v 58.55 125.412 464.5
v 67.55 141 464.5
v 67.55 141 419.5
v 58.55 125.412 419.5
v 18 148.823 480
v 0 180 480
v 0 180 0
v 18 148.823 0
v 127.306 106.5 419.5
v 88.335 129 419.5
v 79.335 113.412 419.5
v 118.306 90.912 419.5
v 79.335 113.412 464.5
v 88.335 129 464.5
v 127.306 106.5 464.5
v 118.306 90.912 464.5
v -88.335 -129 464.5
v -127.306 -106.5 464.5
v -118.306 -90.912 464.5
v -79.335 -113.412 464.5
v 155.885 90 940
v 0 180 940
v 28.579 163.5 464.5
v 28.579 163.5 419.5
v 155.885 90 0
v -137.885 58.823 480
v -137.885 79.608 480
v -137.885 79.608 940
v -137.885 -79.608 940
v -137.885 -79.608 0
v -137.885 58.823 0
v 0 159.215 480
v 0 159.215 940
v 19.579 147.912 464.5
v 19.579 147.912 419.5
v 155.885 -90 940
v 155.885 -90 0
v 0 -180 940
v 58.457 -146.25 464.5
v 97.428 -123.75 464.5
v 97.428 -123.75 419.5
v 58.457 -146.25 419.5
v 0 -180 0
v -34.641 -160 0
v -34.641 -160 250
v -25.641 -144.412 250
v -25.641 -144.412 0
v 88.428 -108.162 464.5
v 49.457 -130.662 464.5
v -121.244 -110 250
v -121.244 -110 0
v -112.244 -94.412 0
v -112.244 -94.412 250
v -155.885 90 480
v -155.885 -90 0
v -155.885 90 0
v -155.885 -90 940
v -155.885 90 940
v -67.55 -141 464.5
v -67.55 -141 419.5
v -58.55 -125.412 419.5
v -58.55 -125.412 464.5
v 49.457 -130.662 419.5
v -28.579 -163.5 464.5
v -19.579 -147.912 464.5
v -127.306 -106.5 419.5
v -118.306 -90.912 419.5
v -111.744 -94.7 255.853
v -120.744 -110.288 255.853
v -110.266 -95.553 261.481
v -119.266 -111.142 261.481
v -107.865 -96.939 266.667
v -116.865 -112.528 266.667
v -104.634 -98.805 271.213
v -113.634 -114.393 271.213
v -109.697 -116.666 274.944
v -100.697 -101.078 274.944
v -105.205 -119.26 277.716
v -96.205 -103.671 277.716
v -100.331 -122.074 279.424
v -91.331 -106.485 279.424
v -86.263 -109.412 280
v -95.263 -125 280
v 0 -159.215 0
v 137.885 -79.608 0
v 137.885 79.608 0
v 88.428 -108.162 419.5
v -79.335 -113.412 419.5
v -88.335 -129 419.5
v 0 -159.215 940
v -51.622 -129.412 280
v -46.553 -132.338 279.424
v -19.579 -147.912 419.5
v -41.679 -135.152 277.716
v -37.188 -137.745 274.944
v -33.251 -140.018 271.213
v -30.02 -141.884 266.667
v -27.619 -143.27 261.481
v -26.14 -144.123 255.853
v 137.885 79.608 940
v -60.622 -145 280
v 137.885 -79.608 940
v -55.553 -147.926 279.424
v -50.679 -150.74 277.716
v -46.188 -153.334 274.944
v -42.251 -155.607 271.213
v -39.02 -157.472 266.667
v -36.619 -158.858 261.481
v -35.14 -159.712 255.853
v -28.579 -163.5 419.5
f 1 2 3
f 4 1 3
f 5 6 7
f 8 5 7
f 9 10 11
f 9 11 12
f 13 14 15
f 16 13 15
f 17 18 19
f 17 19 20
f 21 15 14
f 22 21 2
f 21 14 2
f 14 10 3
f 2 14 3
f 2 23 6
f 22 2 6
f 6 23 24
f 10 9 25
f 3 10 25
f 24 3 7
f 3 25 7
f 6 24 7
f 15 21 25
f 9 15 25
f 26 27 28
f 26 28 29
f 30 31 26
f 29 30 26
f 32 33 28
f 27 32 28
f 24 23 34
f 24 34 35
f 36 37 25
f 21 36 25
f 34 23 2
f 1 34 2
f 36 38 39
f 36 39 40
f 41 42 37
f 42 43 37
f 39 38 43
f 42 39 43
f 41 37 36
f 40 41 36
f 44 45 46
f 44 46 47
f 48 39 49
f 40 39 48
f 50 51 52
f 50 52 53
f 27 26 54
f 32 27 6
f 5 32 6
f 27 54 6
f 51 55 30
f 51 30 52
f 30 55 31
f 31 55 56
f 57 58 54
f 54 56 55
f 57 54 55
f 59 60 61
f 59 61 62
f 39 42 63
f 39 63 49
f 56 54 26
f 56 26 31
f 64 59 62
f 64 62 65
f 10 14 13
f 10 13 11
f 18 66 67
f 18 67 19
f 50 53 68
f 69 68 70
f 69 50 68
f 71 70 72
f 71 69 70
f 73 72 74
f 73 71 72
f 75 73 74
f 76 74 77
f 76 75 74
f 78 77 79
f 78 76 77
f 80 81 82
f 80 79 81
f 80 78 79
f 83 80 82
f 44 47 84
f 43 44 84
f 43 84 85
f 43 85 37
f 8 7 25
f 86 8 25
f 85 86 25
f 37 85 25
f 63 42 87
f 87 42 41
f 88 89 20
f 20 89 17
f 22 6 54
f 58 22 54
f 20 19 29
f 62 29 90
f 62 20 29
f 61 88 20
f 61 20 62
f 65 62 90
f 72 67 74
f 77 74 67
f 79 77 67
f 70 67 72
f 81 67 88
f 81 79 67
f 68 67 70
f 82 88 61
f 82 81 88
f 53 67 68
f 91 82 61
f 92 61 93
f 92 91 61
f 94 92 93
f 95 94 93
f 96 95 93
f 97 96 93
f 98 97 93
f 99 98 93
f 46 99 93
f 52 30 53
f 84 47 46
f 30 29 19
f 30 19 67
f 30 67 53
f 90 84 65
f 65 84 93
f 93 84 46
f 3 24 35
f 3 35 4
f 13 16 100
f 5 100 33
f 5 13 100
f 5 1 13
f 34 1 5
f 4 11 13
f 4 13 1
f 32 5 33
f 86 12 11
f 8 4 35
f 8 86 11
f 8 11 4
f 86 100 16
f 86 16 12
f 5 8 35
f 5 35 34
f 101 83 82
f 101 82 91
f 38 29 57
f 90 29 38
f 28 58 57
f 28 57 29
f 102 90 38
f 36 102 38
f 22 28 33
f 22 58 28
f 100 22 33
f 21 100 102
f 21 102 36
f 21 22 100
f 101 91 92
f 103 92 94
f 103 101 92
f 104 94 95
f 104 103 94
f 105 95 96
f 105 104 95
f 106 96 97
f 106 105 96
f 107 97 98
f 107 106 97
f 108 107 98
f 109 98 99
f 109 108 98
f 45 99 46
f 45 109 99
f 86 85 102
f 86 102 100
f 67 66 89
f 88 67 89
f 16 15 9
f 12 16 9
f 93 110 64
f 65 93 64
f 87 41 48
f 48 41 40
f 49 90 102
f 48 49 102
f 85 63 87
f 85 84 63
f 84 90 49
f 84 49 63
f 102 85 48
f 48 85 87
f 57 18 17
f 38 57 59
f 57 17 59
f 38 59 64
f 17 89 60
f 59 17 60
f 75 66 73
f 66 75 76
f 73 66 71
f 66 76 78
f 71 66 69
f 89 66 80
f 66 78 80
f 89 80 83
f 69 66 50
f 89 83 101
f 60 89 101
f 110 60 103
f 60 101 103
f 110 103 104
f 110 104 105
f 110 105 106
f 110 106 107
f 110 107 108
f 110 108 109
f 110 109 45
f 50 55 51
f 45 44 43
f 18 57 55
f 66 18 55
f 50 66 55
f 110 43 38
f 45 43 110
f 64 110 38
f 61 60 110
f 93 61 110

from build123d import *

# Parameters (mm, degrees)
BOSS_EXTRUDE2_DEPTH = 940
CUT_EXTRUDE3_REACH  = 1020.577
SKETCH4_W           = 45
SKETCH4_H           = 45
CUT_EXTRUDE4_REACH  = 1020.577
SKETCH5_W           = 45
SKETCH5_H           = 45
CUT_EXTRUDE6_REACH  = 1020.577
SKETCH7_W           = 180
SKETCH7_H           = 480
SKETCH9_W           = 45
SKETCH9_H           = 45
CUT_EXTRUDE7_DEPTH  = 18


with BuildPart() as part:
    # Sketch1 → Boss-Extrude2 (new body)
    with BuildSketch(Plane.XY):
        Polygon((0, 180), (-155.884572681, 90), (-155.884572681, -90), (0, -180), (155.884572681, -90), (155.884572681, 90), align=None)
        Polygon((-137.884572681, 79.607695155), (-137.884572681, -79.607695155), (0, -159.215390309), (137.884572681, -79.607695155), (137.884572681, 79.607695155), (0, 159.215390309), align=None, mode=Mode.SUBTRACT)
    extrude(amount=BOSS_EXTRUDE2_DEPTH)

    # Sketch4 → Cut-Extrude3 (cut, up to next)
    with BuildSketch(Plane(origin=(77.942286341, -135, 0), x_dir=(0.8660254037844388, 0.4999999999999997, 0), z_dir=(0.4999999999999997, -0.8660254037844388, 0)), mode=Mode.PRIVATE) as cut_extrude3_sk1:
        with Locations((0, 442)):
            Rectangle(SKETCH4_W, SKETCH4_H)
    cut_extrude3_tool1 = extrude(cut_extrude3_sk1.sketch, amount=-CUT_EXTRUDE3_REACH, mode=Mode.PRIVATE) & part.part
    add(cut_extrude3_tool1.solids().sort_by_distance((77.942286, -135, 442))[0], mode=Mode.SUBTRACT)

    # Sketch5 → Cut-Extrude4 (cut, up to next)
    with BuildSketch(Plane(origin=(-77.942286341, -135, 0), x_dir=(0.8660254037844386, -0.5000000000000001, 0), z_dir=(-0.5000000000000001, -0.8660254037844386, 0)), mode=Mode.PRIVATE) as cut_extrude4_sk1:
        with Locations((34.5, 442)):
            Rectangle(SKETCH5_W, SKETCH5_H)
    cut_extrude4_tool1 = extrude(cut_extrude4_sk1.sketch, amount=-CUT_EXTRUDE4_REACH, mode=Mode.PRIVATE) & part.part
    # Sketch5 → Cut-Extrude4 (cut, up to next)
    with BuildSketch(Plane(origin=(-77.942286341, -135, 0), x_dir=(0.8660254037844386, -0.5000000000000001, 0), z_dir=(-0.5000000000000001, -0.8660254037844386, 0)), mode=Mode.PRIVATE) as cut_extrude4_sk2:
        with Locations((-34.5, 442)):
            Rectangle(SKETCH5_W, SKETCH5_H)
    cut_extrude4_tool2 = extrude(cut_extrude4_sk2.sketch, amount=-CUT_EXTRUDE4_REACH, mode=Mode.PRIVATE) & part.part
    # Sketch5 → Cut-Extrude4 (cut, up to next)
    with BuildSketch(Plane(origin=(-77.942286341, -135, 0), x_dir=(0.8660254037844386, -0.5000000000000001, 0), z_dir=(-0.5000000000000001, -0.8660254037844386, 0)), mode=Mode.PRIVATE) as cut_extrude4_sk3:
        with BuildLine():
            Line((-20, 280), (20, 280))
            ThreePointArc((20, 280), (41.213203436, 271.213203436), (50, 250))
            Line((50, 250), (50, 0))
            Line((50, 0), (-50, 0))
            Line((-50, 0), (-50, 250))
            ThreePointArc((-50, 250), (-41.213203436, 271.213203436), (-20, 280))
        make_face()
    cut_extrude4_tool3 = extrude(cut_extrude4_sk3.sketch, amount=-CUT_EXTRUDE4_REACH, mode=Mode.PRIVATE) & part.part
    add(cut_extrude4_tool1.solids().sort_by_distance((-48.06441, -152.25, 442))[0], mode=Mode.SUBTRACT)
    add(cut_extrude4_tool2.solids().sort_by_distance((-107.820163, -117.75, 442))[0], mode=Mode.SUBTRACT)
    add(cut_extrude4_tool3.solids().sort_by_distance((-77.942286, -135, 138.135305))[0], mode=Mode.SUBTRACT)

    # Sketch7 → Cut-Extrude6 (cut, up to next)
    with BuildSketch(Plane(origin=(-77.942286341, 135, 0), x_dir=(0.8660254037844388, 0.49999999999999983, 0), z_dir=(-0.4999999999999998, 0.8660254037844387, 0)), mode=Mode.PRIVATE) as cut_extrude6_sk1:
        with Locations((0, -240)):
            Rectangle(SKETCH7_W, SKETCH7_H)
    cut_extrude6_tool1 = extrude(cut_extrude6_sk1.sketch, amount=-CUT_EXTRUDE6_REACH, mode=Mode.PRIVATE) & part.part
    add(cut_extrude6_tool1.solids().sort_by_distance((-77.942286, 135, 240))[0], mode=Mode.SUBTRACT)

    # Sketch9 → Cut-Extrude7 (cut)
    with BuildSketch(Plane(origin=(77.942286341, 135, 0), x_dir=(0.8660254037844386, -0.4999999999999999, 0), z_dir=(0.49999999999999994, 0.8660254037844387, 0))):
        with Locations((-34.5, -442)):
            Rectangle(SKETCH9_W, SKETCH9_H)
        with Locations((34.5, -442)):
            Rectangle(SKETCH9_W, SKETCH9_H)
    extrude(amount=-CUT_EXTRUDE7_DEPTH, mode=Mode.SUBTRACT)


solid = part.part
